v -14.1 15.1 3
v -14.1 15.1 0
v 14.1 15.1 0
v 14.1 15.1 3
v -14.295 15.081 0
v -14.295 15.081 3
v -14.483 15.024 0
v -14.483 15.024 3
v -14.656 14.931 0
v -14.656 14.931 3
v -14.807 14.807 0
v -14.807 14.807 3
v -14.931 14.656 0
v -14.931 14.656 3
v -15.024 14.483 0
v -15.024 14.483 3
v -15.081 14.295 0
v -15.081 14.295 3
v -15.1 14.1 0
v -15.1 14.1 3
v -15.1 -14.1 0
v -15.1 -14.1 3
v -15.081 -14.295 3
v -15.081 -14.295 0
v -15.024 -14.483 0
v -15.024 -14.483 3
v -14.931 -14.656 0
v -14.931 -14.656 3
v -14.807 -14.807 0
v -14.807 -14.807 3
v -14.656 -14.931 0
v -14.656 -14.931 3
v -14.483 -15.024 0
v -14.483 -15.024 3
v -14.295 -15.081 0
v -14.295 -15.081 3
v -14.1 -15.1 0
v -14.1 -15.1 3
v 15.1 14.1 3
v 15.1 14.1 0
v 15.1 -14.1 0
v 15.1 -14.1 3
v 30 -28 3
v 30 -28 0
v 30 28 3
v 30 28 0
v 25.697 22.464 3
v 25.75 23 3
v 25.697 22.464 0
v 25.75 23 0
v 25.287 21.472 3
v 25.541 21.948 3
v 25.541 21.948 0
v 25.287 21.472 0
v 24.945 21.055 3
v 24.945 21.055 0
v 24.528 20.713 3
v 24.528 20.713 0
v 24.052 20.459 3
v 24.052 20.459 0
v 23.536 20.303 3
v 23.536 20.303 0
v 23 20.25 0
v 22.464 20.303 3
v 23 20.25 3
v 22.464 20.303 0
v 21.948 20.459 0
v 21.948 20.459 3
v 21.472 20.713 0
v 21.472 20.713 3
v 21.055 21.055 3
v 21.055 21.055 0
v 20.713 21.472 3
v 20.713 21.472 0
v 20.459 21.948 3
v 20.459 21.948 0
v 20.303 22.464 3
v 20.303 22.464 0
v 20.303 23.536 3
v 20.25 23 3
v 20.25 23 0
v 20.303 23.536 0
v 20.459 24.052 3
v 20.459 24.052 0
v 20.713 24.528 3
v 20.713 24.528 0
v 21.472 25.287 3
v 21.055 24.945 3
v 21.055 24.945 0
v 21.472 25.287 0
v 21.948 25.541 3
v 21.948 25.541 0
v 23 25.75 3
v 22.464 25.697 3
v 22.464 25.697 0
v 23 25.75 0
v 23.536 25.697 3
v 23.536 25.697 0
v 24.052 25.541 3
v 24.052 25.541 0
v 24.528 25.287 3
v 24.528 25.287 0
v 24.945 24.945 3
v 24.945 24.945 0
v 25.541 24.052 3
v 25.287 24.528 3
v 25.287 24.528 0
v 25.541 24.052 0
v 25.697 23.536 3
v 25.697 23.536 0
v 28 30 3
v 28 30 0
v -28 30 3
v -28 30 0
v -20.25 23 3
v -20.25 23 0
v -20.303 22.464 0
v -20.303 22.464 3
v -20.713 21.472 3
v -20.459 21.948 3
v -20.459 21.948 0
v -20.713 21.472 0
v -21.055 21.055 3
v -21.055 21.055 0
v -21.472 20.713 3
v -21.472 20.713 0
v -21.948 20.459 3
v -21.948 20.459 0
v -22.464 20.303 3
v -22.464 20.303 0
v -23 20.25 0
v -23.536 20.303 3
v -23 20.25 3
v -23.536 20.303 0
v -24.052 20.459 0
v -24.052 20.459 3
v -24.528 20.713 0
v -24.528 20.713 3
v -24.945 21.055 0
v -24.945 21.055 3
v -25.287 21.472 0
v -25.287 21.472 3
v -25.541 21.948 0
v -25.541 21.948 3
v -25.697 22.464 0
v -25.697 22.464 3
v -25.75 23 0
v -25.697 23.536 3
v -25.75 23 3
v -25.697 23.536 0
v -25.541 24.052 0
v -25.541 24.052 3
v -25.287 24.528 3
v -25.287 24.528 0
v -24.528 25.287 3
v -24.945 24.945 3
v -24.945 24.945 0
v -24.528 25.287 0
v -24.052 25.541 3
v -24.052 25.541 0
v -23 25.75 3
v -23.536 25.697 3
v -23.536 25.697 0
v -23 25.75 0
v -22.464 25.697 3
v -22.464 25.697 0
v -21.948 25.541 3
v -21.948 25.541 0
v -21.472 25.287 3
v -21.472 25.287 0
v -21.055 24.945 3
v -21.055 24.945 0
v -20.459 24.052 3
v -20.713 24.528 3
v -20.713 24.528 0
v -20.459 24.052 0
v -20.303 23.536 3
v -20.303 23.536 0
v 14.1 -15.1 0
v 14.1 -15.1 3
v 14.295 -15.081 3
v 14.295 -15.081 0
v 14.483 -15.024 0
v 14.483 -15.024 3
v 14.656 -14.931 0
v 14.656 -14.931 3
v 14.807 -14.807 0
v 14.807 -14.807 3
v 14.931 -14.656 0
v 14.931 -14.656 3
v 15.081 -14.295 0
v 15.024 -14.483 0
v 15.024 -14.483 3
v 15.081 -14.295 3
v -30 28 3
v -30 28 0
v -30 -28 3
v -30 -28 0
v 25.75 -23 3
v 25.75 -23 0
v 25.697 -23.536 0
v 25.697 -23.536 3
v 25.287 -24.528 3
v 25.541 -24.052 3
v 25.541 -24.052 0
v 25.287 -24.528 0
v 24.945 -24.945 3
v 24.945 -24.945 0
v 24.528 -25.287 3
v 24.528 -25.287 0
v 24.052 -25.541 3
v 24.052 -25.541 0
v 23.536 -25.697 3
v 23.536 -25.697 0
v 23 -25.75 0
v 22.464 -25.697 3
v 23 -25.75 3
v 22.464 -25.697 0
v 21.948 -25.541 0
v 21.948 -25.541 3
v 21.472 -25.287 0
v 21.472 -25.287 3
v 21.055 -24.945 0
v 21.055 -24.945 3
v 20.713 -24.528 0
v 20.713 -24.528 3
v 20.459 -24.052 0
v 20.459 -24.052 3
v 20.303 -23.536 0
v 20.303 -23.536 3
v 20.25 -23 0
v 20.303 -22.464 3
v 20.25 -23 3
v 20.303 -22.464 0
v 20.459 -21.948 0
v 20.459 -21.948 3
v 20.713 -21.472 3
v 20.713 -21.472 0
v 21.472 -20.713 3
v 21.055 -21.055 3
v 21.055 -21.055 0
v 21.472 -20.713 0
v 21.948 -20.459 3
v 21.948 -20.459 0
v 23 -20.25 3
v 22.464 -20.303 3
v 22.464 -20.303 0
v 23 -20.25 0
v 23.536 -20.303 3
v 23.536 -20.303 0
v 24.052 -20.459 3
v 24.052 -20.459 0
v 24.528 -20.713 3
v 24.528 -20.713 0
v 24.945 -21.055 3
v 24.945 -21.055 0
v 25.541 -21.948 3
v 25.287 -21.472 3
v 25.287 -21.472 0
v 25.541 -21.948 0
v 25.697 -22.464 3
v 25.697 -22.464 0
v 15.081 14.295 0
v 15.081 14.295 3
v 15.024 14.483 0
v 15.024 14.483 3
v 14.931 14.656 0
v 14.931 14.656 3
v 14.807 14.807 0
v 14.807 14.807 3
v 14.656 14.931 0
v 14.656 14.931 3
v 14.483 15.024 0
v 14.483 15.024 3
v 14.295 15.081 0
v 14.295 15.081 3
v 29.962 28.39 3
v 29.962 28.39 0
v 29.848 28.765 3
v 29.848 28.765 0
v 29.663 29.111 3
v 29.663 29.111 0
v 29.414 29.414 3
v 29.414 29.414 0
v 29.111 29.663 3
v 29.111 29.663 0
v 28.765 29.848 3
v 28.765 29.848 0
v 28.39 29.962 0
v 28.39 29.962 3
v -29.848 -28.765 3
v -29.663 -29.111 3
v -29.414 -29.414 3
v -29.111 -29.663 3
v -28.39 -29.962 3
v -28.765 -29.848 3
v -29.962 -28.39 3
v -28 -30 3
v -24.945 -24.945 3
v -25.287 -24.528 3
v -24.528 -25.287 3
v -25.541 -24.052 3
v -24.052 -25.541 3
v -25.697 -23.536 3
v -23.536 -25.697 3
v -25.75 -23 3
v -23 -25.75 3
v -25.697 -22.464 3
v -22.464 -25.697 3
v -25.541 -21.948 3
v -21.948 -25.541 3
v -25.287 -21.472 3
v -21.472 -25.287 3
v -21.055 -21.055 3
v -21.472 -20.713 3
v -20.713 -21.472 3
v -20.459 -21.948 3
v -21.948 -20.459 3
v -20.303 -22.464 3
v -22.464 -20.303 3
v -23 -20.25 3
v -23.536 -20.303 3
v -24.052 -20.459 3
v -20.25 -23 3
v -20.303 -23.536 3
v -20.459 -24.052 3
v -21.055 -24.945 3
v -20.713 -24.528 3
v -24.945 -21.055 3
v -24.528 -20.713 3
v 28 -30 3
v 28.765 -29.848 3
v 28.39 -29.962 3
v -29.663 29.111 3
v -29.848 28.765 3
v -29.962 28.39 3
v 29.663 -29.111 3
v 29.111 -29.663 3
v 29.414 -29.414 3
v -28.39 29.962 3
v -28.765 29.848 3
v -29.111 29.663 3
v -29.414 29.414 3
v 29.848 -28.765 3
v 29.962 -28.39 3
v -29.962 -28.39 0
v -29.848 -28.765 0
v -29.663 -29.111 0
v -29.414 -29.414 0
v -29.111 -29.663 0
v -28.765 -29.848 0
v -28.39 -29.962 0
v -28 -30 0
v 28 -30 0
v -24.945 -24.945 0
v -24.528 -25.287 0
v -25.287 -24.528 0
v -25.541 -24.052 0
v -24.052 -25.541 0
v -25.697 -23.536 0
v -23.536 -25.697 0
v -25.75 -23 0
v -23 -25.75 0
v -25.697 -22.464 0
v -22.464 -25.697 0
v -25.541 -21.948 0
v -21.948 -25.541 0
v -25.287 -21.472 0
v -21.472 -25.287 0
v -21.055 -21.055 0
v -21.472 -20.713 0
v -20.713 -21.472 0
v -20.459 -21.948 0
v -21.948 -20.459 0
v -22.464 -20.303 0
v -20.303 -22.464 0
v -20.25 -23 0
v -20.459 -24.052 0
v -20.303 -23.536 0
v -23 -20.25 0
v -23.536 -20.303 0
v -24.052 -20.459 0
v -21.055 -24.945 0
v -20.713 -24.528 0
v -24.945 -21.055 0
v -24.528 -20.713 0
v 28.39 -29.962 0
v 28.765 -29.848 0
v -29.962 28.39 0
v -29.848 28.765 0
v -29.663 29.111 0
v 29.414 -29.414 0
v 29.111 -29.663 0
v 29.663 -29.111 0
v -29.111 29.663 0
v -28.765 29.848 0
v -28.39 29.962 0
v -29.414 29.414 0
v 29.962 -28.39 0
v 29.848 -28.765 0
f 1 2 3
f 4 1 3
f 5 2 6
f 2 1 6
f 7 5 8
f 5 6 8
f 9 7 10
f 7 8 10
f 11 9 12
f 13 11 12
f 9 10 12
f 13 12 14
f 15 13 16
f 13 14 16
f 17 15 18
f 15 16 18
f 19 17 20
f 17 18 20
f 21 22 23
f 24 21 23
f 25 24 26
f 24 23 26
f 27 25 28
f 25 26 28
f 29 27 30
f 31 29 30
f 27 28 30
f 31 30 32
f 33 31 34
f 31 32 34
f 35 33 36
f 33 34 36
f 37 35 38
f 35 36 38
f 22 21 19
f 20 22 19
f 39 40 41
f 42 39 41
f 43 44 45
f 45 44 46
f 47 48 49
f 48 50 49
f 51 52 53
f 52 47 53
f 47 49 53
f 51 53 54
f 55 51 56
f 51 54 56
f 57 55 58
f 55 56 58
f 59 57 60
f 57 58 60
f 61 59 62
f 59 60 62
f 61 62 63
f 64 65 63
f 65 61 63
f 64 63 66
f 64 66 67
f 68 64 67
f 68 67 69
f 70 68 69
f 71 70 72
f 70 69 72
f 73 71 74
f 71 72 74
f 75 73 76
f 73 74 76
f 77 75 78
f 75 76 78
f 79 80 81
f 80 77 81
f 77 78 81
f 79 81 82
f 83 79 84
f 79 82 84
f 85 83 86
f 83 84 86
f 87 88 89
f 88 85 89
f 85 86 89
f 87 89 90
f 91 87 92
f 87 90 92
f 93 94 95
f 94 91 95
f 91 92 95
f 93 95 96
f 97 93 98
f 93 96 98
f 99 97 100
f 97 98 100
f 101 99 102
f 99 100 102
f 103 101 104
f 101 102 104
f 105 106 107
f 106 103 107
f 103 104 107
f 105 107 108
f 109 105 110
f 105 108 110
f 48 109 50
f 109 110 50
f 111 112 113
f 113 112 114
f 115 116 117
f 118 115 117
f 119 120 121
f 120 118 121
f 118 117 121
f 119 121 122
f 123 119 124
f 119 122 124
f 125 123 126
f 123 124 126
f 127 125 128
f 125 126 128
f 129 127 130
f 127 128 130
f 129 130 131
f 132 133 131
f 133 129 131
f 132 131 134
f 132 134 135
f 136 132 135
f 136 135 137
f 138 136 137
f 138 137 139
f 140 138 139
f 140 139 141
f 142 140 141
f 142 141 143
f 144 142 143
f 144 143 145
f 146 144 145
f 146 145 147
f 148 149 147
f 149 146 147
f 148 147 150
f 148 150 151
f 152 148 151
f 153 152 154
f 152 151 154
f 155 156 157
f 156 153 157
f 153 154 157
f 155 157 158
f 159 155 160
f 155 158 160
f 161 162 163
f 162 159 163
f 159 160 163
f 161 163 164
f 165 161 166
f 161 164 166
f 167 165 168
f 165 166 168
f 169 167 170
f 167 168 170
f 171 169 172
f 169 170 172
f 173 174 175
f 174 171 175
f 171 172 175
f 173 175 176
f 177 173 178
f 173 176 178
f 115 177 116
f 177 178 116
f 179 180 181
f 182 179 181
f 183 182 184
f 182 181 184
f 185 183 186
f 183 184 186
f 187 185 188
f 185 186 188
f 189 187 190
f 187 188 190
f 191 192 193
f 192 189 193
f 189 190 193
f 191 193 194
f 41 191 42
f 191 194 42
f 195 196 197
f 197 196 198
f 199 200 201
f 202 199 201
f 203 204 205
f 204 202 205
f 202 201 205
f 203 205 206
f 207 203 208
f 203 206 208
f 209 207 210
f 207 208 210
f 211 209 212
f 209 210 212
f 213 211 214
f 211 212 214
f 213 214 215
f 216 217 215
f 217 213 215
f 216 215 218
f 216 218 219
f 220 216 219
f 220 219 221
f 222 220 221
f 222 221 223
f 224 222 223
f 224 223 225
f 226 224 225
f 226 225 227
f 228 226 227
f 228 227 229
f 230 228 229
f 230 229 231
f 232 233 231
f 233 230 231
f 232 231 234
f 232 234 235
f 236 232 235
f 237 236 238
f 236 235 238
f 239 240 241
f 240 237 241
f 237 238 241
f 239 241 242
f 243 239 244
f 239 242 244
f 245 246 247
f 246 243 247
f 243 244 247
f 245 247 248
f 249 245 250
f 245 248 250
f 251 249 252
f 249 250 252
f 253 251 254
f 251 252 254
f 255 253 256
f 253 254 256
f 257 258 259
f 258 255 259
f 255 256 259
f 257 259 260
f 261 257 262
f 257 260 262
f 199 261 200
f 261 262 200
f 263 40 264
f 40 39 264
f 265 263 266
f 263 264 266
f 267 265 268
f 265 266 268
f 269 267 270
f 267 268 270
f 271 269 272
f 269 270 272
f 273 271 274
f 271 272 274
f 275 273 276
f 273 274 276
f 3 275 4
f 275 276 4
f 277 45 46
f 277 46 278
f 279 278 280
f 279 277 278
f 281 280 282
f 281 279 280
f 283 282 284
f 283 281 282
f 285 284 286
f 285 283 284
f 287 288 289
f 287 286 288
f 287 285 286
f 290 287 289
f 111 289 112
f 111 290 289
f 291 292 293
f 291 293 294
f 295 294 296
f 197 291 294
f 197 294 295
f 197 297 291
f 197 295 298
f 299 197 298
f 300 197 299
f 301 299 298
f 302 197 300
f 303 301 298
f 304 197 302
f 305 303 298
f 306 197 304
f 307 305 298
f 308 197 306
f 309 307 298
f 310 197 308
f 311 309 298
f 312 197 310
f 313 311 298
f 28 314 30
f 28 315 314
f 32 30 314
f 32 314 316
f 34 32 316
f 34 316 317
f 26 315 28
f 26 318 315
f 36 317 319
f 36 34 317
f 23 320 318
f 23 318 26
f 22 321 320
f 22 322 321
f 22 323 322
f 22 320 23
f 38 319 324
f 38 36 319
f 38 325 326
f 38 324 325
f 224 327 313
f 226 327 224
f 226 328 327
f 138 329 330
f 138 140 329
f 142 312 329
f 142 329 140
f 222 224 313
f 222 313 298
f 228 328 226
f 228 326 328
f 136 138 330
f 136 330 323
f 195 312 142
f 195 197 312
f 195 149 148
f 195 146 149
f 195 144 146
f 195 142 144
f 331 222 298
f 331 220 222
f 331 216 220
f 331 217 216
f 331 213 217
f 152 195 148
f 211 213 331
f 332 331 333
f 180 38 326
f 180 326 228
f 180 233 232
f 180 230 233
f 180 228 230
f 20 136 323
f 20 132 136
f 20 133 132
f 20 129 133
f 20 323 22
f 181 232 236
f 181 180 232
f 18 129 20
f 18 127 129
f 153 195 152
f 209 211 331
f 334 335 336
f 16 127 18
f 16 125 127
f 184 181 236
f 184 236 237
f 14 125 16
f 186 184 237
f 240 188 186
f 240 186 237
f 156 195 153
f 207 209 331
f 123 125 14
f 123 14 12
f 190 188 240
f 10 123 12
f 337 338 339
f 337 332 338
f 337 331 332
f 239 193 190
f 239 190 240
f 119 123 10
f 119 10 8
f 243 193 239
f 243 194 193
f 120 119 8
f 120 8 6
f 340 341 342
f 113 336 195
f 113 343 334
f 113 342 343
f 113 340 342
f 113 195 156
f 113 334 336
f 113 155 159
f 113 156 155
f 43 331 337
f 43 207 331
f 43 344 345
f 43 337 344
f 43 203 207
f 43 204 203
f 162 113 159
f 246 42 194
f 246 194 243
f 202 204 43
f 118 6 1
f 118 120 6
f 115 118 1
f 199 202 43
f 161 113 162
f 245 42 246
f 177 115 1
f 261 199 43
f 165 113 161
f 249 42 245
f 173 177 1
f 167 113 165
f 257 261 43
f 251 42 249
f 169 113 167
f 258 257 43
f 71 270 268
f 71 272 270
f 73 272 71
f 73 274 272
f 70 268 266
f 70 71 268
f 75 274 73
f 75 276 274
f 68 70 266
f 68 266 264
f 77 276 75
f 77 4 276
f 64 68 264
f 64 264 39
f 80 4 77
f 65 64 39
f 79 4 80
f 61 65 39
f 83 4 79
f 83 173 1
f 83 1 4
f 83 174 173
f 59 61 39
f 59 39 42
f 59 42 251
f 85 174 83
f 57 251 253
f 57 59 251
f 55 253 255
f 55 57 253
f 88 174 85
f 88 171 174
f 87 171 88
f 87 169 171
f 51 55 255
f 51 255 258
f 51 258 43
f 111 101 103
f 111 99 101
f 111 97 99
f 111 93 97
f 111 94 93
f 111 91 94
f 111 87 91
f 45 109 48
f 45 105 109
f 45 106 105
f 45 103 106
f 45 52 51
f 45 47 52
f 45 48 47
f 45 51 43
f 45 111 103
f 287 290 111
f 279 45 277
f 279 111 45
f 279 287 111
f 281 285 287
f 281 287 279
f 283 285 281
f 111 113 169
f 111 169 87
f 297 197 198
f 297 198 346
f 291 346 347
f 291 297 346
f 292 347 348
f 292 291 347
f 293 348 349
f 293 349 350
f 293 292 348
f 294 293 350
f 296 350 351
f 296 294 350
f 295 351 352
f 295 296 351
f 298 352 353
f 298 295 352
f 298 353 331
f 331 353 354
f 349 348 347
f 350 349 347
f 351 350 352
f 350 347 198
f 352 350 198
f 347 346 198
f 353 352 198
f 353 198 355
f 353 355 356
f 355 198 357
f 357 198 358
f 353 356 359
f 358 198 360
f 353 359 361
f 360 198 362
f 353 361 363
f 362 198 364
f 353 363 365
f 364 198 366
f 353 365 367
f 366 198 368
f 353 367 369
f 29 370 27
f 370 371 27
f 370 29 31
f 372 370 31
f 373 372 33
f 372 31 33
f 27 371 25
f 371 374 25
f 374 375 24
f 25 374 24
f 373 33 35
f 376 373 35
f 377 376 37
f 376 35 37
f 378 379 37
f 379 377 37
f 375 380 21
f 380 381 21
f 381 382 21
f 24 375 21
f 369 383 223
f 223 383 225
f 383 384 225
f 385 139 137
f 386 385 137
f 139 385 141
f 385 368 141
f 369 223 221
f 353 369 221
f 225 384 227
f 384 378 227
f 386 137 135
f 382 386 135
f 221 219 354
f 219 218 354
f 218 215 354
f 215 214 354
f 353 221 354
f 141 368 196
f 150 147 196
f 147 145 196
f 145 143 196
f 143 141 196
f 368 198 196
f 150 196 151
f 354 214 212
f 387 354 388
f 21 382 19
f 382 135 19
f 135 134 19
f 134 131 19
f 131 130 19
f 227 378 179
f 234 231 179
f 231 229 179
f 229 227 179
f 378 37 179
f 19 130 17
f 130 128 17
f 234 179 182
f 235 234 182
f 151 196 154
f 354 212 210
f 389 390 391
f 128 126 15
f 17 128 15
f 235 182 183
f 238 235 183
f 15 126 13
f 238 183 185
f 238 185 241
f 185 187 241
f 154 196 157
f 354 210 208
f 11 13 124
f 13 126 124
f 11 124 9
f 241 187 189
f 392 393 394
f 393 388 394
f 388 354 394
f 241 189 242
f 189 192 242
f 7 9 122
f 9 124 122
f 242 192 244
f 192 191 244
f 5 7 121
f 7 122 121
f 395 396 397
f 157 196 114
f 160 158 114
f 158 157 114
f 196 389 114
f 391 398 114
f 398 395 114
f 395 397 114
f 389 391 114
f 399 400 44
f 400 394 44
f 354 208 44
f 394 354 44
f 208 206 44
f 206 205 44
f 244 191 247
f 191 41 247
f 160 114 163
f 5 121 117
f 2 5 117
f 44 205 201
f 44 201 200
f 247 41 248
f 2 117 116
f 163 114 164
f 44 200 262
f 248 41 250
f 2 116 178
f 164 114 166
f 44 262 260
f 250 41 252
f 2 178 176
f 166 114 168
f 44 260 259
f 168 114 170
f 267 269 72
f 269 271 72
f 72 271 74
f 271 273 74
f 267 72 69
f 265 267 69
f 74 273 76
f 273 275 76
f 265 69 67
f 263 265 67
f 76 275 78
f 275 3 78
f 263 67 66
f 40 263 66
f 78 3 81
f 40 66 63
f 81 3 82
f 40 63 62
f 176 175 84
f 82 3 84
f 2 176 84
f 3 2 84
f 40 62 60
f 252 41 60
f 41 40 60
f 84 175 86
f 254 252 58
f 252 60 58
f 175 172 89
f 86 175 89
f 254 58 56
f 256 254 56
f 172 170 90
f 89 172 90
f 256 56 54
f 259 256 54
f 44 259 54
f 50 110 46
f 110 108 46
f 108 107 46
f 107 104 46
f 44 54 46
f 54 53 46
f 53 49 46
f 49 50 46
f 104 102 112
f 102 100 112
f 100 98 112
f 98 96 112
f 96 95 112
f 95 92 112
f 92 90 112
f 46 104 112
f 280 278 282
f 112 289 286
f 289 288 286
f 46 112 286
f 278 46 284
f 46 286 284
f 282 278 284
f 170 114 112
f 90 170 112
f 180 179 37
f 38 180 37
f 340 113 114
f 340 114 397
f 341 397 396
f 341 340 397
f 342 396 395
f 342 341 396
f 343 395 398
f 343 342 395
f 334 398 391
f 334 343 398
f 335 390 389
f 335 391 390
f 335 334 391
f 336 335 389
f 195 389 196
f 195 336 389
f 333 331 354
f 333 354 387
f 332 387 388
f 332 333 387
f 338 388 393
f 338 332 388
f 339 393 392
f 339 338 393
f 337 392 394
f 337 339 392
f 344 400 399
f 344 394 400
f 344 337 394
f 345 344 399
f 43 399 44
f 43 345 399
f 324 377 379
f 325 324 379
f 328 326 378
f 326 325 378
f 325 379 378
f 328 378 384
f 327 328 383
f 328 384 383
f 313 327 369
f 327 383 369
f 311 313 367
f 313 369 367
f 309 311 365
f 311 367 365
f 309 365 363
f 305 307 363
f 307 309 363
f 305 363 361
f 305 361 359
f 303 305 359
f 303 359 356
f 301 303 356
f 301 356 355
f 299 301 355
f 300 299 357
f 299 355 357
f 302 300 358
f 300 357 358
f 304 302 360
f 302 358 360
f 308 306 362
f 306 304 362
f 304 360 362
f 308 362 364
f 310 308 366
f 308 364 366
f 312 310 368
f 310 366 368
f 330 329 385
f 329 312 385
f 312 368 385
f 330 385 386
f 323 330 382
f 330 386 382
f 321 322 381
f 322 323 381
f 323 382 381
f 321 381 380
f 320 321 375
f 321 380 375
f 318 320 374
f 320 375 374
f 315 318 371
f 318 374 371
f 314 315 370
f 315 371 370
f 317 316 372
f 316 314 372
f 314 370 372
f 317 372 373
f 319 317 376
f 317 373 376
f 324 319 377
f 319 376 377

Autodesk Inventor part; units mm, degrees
ref_plane "YZ Plane" through (0, 0, 0) normal (1, 0, 0) x (0, 1, 0)
ref_plane "XZ Plane" through (0, 0, 0) normal (0, 1, 0) x (-1, 0, 0)
ref_plane "XY Plane" through (0, 0, 0) normal (0, 0, 1) x (1, 0, 0)
sketch "Sketch1" plane through (0, 0, 0) normal (0, 0, 1) x (1, 0, 0)
  line L0 (-30, -30) -> (30, -30)
  line L1 (30, -30) -> (30, 30)
  line L2 (30, 30) -> (-30, 30)
  line L3 (-30, 30) -> (-30, -30)
  line L4 (-30, -30) -> (30, 30) construction
  line L5 (30, -30) -> (-30, 30) construction
  line L6 (15.1, -15.1) -> (-15.1, -15.1)
  line L7 (-15.1, -15.1) -> (-15.1, 15.1)
  line L8 (-15.1, 15.1) -> (15.1, 15.1)
  line L9 (15.1, 15.1) -> (15.1, -15.1)
  line L10 (15.1, -15.1) -> (-15.1, 15.1) construction
  line L11 (-15.1, -15.1) -> (15.1, 15.1) construction
  circle A0 centre (-23, -23) radius 2.75
  circle A1 centre (23, -23) radius 2.75
  circle A2 centre (23, 23) radius 2.75
  circle A3 centre (-23, 23) radius 2.75
  line L12 (25.75, 25.75) -> (-25.75, 25.75) construction
  line L13 (-25.75, 25.75) -> (-25.75, -25.75) construction
  line L14 (-25.75, -25.75) -> (25.75, -25.75) construction
  line L15 (25.75, -25.75) -> (25.75, 25.75) construction
  line L16 (25.75, 25.75) -> (-25.75, -25.75) construction
  line L17 (-25.75, 25.75) -> (25.75, -25.75) construction
  line L18 (23, 23) -> (-23, 23) construction
  line L19 (-23, 23) -> (-23, -23) construction
  line L20 (-23, -23) -> (23, -23) construction
  line L21 (23, -23) -> (23, 23) construction
  line L22 (23, 23) -> (-23, -23) construction
  line L23 (-23, 23) -> (23, -23) construction
  point P0 (0, 0)
  dimension "d172" = 30.2
  dimension "d190" = 5.5
  dimension "d191" = 46
  dimension "d192" = 60
extrude "Plate5" add sketch "Sketch1" along normal blind 3
fillet "Corner Round1" radius 2 4 edges at (30, 30, 1.5) (-30, 30, 1.5) (-30, -30, 1.5) (30, -30, 1.5)
fillet "Corner Round2" radius 1 4 edges at (-15.1, 15.1, 1.5) (-15.1, -15.1, 1.5) (15.1, -15.1, 1.5) (15.1, 15.1, 1.5)
properties part number "SLM 1425 FDS Way FLANGE" material "Stainless Steel"
